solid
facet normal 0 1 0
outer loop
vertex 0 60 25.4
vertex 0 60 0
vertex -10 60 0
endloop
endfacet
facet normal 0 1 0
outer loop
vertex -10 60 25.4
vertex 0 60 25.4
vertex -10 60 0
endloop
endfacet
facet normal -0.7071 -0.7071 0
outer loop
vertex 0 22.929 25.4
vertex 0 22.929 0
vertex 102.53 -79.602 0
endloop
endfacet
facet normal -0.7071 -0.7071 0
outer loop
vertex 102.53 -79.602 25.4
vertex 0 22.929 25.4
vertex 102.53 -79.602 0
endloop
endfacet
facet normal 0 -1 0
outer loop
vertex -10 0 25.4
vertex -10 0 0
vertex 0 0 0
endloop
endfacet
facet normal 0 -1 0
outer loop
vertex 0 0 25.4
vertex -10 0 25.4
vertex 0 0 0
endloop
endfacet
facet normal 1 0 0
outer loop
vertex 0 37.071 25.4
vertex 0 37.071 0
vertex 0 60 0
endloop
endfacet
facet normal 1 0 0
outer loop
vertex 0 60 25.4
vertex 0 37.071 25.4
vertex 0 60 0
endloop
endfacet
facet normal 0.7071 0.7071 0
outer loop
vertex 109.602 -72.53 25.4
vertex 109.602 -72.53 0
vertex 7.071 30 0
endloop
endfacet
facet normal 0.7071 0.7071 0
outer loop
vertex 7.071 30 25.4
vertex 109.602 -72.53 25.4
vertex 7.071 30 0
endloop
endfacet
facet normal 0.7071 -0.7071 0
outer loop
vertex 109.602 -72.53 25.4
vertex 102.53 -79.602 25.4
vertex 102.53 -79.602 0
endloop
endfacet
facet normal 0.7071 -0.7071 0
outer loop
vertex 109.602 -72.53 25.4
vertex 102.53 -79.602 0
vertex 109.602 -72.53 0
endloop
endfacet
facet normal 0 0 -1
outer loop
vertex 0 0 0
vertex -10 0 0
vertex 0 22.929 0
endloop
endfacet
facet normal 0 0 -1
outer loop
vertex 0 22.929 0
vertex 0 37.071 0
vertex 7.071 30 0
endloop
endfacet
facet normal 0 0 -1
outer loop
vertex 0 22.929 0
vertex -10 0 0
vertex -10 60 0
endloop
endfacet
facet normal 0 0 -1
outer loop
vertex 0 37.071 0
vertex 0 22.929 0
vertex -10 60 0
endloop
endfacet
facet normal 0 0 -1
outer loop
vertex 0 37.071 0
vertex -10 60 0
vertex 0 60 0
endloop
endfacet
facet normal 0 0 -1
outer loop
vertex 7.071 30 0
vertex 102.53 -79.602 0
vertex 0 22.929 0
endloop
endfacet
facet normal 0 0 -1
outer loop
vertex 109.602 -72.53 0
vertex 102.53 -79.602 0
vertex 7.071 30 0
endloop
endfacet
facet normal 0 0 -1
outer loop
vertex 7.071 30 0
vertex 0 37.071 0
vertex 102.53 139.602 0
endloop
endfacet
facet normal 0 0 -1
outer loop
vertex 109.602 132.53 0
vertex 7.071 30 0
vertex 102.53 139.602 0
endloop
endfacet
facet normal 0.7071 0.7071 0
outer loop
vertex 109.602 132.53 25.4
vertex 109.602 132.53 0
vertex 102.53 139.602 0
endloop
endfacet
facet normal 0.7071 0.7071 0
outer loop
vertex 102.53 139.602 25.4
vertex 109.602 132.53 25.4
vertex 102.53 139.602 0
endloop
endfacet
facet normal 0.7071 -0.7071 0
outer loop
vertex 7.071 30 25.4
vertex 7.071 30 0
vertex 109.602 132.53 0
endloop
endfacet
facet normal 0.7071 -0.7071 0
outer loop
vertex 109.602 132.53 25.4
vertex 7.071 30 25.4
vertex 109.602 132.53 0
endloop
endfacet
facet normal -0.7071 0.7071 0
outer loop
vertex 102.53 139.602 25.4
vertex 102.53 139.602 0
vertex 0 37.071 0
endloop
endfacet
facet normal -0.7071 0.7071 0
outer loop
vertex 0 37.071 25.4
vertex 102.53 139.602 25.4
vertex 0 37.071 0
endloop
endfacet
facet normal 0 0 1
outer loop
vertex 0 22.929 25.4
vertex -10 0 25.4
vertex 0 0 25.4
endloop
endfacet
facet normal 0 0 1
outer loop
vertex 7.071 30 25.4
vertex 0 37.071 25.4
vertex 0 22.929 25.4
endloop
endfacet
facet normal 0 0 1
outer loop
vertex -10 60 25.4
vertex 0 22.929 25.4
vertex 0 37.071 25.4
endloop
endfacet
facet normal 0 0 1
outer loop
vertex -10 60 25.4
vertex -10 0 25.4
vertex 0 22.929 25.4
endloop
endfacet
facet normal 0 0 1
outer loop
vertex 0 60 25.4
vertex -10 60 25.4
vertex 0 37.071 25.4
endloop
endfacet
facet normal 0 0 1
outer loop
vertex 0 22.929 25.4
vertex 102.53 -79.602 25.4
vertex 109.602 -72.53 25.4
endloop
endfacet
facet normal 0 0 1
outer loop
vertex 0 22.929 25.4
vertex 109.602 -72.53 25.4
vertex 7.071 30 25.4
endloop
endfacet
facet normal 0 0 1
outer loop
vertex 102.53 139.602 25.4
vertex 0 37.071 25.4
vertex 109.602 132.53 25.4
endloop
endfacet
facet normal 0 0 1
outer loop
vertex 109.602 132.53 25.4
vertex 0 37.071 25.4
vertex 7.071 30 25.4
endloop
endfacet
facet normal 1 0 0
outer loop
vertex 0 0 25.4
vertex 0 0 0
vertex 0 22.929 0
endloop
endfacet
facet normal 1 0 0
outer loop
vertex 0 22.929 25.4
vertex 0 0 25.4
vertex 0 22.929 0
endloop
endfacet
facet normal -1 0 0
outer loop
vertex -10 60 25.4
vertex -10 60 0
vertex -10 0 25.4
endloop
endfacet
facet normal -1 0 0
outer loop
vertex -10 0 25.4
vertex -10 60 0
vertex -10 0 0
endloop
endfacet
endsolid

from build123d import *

# Parameters (mm, degrees)
F1_DEPTH = 12.7
F2_DEPTH = 25.4


with BuildPart() as f1:
    # F0 (on Top) → F1 (new body)
    with BuildSketch(Plane.XY):
        Polygon((106.066017, 136.066017), (0, 30), (106.066017, -76.066017), (109.601551, -72.530483), (7.071068, 30), (109.601551, 132.530483), align=None)
    extrude(amount=F1_DEPTH)

    # F0 (on Top) → F2 (join)
    with BuildSketch(Plane.XY):
        Polygon((-10, 0), (0, 0), (0, 22.928932), (0, 30), (0, 37.071068), (0, 60), (-10, 60), align=None)
        Polygon((0, 30), (0, 22.928932), (102.530483, -79.601551), (106.066017, -76.066017), align=None)
        Polygon((0, 37.071068), (0, 30), (106.066017, 136.066017), (102.530483, 139.601551), align=None)
        Polygon((106.066017, 136.066017), (0, 30), (106.066017, -76.066017), (109.601551, -72.530483), (7.071068, 30), (109.601551, 132.530483), align=None)
    extrude(amount=F2_DEPTH)


solid = f1.part
